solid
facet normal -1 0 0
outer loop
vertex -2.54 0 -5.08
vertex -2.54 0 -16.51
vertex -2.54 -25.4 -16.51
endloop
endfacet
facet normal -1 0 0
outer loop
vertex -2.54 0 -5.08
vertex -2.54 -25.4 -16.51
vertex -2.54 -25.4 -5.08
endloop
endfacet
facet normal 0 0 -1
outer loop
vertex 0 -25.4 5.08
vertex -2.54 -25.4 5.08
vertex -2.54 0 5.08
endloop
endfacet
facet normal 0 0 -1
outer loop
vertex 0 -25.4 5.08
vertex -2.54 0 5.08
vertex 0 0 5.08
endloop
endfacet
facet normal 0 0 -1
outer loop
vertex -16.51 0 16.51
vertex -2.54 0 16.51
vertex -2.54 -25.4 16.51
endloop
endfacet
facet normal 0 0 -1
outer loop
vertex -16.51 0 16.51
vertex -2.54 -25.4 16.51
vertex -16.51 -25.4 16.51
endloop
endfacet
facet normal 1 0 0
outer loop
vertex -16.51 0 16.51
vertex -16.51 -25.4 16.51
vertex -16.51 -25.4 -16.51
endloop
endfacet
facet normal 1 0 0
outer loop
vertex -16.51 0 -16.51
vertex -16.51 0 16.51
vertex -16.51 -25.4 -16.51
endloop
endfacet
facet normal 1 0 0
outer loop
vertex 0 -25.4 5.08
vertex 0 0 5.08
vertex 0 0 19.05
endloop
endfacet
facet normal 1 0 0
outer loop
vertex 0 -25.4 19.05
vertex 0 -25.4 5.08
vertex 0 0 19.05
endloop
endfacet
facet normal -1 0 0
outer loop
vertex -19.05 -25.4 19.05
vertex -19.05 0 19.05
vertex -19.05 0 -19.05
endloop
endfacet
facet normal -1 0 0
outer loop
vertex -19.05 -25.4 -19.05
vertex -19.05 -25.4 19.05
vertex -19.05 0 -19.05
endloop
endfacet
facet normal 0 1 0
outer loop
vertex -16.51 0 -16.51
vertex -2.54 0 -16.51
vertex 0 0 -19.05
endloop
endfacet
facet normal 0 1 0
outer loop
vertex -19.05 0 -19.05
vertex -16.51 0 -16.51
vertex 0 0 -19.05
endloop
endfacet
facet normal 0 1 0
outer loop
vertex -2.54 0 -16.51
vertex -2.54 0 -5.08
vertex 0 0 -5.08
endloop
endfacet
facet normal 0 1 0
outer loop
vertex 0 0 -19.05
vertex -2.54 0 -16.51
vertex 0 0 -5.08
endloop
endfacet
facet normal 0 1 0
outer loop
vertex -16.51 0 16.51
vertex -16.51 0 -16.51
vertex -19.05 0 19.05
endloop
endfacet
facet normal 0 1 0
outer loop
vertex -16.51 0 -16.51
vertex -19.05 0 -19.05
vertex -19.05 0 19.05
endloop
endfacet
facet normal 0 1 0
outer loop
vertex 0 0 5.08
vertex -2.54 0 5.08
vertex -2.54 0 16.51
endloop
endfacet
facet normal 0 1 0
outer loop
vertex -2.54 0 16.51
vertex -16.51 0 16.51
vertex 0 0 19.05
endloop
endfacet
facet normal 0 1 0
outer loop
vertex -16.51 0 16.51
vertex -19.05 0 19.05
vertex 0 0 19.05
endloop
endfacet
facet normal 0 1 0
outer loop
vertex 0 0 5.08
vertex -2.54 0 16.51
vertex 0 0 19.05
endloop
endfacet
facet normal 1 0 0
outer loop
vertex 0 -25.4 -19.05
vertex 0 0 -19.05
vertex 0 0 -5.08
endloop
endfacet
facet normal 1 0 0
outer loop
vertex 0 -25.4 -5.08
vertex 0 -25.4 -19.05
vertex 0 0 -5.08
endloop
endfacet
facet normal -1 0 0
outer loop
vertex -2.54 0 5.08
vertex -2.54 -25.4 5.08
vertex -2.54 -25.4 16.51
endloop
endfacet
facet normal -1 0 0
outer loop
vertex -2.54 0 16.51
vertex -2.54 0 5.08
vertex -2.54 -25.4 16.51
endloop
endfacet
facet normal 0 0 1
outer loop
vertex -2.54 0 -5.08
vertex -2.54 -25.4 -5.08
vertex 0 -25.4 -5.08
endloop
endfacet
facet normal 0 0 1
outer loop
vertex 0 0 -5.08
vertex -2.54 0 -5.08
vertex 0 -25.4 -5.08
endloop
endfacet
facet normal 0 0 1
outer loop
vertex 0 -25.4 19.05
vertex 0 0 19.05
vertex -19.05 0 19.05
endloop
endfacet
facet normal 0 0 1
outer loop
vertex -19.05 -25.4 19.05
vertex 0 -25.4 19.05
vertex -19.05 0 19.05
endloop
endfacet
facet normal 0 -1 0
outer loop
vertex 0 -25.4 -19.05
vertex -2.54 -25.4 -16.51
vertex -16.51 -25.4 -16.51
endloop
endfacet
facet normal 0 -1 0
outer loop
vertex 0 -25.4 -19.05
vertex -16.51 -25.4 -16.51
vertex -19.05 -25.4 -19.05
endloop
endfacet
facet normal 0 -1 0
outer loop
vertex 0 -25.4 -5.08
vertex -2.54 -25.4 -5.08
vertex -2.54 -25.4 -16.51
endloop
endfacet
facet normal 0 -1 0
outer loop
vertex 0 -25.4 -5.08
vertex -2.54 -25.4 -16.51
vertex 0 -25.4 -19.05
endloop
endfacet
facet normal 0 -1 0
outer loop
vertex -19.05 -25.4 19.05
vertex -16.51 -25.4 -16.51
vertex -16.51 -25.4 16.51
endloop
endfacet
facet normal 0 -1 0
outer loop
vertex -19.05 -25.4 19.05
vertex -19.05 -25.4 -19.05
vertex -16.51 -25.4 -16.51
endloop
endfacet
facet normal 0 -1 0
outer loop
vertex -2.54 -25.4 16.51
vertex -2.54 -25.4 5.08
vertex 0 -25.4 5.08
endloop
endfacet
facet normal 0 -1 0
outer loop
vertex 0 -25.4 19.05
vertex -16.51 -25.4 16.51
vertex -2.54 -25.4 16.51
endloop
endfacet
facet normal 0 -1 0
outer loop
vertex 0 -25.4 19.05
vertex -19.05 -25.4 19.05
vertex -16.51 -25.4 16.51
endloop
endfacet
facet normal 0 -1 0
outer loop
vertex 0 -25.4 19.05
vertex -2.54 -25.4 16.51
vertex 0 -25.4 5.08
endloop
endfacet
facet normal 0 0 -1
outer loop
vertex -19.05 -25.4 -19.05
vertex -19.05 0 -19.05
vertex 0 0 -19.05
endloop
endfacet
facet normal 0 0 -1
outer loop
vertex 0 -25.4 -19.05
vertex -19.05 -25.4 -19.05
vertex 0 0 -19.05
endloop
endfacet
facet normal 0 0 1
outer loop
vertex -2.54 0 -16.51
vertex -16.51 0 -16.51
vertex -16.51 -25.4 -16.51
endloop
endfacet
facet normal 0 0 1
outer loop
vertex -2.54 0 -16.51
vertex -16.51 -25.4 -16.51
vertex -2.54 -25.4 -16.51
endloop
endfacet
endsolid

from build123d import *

# Parameters (mm, degrees)
F1_DEPTH = 25.4
F2_T     = -2.54
F3_DEPTH = 25.4
F4_W     = 2.54
F4_H     = 10.16
F5_DEPTH = 25.4


with BuildPart() as f1:
    # F0 (on Front) → F1 (new body)
    with BuildSketch(Plane.XZ):
        Polygon((0, -8.89), (0, 8.89), (0, 19.05), (-19.05, 19.05), (-19.05, 0), (-19.05, -19.05), (0, -19.05), align=None)
    extrude(amount=F1_DEPTH)

    # F2
    f2_openings = [f1.faces().sort_by_distance(p)[0] for p in [
        (-9.525, -25.4, 0),
    ]]
    offset(amount=F2_T, openings=f2_openings)

    # F3 (cut): a face of the model
    f3_faces = [f1.faces().sort_by_distance(p)[0] for p in [
        (-9.525, -2.54, 0),
    ]]
    extrude(f3_faces, amount=-F3_DEPTH, mode=Mode.SUBTRACT)

    # F4 (on face) → F5 (cut)
    with BuildSketch(Plane.XZ.offset(25.4)):
        with Locations((-1.27, 0)):
            Rectangle(F4_W, F4_H)
    extrude(amount=-F5_DEPTH, mode=Mode.SUBTRACT)


solid = f1.part
